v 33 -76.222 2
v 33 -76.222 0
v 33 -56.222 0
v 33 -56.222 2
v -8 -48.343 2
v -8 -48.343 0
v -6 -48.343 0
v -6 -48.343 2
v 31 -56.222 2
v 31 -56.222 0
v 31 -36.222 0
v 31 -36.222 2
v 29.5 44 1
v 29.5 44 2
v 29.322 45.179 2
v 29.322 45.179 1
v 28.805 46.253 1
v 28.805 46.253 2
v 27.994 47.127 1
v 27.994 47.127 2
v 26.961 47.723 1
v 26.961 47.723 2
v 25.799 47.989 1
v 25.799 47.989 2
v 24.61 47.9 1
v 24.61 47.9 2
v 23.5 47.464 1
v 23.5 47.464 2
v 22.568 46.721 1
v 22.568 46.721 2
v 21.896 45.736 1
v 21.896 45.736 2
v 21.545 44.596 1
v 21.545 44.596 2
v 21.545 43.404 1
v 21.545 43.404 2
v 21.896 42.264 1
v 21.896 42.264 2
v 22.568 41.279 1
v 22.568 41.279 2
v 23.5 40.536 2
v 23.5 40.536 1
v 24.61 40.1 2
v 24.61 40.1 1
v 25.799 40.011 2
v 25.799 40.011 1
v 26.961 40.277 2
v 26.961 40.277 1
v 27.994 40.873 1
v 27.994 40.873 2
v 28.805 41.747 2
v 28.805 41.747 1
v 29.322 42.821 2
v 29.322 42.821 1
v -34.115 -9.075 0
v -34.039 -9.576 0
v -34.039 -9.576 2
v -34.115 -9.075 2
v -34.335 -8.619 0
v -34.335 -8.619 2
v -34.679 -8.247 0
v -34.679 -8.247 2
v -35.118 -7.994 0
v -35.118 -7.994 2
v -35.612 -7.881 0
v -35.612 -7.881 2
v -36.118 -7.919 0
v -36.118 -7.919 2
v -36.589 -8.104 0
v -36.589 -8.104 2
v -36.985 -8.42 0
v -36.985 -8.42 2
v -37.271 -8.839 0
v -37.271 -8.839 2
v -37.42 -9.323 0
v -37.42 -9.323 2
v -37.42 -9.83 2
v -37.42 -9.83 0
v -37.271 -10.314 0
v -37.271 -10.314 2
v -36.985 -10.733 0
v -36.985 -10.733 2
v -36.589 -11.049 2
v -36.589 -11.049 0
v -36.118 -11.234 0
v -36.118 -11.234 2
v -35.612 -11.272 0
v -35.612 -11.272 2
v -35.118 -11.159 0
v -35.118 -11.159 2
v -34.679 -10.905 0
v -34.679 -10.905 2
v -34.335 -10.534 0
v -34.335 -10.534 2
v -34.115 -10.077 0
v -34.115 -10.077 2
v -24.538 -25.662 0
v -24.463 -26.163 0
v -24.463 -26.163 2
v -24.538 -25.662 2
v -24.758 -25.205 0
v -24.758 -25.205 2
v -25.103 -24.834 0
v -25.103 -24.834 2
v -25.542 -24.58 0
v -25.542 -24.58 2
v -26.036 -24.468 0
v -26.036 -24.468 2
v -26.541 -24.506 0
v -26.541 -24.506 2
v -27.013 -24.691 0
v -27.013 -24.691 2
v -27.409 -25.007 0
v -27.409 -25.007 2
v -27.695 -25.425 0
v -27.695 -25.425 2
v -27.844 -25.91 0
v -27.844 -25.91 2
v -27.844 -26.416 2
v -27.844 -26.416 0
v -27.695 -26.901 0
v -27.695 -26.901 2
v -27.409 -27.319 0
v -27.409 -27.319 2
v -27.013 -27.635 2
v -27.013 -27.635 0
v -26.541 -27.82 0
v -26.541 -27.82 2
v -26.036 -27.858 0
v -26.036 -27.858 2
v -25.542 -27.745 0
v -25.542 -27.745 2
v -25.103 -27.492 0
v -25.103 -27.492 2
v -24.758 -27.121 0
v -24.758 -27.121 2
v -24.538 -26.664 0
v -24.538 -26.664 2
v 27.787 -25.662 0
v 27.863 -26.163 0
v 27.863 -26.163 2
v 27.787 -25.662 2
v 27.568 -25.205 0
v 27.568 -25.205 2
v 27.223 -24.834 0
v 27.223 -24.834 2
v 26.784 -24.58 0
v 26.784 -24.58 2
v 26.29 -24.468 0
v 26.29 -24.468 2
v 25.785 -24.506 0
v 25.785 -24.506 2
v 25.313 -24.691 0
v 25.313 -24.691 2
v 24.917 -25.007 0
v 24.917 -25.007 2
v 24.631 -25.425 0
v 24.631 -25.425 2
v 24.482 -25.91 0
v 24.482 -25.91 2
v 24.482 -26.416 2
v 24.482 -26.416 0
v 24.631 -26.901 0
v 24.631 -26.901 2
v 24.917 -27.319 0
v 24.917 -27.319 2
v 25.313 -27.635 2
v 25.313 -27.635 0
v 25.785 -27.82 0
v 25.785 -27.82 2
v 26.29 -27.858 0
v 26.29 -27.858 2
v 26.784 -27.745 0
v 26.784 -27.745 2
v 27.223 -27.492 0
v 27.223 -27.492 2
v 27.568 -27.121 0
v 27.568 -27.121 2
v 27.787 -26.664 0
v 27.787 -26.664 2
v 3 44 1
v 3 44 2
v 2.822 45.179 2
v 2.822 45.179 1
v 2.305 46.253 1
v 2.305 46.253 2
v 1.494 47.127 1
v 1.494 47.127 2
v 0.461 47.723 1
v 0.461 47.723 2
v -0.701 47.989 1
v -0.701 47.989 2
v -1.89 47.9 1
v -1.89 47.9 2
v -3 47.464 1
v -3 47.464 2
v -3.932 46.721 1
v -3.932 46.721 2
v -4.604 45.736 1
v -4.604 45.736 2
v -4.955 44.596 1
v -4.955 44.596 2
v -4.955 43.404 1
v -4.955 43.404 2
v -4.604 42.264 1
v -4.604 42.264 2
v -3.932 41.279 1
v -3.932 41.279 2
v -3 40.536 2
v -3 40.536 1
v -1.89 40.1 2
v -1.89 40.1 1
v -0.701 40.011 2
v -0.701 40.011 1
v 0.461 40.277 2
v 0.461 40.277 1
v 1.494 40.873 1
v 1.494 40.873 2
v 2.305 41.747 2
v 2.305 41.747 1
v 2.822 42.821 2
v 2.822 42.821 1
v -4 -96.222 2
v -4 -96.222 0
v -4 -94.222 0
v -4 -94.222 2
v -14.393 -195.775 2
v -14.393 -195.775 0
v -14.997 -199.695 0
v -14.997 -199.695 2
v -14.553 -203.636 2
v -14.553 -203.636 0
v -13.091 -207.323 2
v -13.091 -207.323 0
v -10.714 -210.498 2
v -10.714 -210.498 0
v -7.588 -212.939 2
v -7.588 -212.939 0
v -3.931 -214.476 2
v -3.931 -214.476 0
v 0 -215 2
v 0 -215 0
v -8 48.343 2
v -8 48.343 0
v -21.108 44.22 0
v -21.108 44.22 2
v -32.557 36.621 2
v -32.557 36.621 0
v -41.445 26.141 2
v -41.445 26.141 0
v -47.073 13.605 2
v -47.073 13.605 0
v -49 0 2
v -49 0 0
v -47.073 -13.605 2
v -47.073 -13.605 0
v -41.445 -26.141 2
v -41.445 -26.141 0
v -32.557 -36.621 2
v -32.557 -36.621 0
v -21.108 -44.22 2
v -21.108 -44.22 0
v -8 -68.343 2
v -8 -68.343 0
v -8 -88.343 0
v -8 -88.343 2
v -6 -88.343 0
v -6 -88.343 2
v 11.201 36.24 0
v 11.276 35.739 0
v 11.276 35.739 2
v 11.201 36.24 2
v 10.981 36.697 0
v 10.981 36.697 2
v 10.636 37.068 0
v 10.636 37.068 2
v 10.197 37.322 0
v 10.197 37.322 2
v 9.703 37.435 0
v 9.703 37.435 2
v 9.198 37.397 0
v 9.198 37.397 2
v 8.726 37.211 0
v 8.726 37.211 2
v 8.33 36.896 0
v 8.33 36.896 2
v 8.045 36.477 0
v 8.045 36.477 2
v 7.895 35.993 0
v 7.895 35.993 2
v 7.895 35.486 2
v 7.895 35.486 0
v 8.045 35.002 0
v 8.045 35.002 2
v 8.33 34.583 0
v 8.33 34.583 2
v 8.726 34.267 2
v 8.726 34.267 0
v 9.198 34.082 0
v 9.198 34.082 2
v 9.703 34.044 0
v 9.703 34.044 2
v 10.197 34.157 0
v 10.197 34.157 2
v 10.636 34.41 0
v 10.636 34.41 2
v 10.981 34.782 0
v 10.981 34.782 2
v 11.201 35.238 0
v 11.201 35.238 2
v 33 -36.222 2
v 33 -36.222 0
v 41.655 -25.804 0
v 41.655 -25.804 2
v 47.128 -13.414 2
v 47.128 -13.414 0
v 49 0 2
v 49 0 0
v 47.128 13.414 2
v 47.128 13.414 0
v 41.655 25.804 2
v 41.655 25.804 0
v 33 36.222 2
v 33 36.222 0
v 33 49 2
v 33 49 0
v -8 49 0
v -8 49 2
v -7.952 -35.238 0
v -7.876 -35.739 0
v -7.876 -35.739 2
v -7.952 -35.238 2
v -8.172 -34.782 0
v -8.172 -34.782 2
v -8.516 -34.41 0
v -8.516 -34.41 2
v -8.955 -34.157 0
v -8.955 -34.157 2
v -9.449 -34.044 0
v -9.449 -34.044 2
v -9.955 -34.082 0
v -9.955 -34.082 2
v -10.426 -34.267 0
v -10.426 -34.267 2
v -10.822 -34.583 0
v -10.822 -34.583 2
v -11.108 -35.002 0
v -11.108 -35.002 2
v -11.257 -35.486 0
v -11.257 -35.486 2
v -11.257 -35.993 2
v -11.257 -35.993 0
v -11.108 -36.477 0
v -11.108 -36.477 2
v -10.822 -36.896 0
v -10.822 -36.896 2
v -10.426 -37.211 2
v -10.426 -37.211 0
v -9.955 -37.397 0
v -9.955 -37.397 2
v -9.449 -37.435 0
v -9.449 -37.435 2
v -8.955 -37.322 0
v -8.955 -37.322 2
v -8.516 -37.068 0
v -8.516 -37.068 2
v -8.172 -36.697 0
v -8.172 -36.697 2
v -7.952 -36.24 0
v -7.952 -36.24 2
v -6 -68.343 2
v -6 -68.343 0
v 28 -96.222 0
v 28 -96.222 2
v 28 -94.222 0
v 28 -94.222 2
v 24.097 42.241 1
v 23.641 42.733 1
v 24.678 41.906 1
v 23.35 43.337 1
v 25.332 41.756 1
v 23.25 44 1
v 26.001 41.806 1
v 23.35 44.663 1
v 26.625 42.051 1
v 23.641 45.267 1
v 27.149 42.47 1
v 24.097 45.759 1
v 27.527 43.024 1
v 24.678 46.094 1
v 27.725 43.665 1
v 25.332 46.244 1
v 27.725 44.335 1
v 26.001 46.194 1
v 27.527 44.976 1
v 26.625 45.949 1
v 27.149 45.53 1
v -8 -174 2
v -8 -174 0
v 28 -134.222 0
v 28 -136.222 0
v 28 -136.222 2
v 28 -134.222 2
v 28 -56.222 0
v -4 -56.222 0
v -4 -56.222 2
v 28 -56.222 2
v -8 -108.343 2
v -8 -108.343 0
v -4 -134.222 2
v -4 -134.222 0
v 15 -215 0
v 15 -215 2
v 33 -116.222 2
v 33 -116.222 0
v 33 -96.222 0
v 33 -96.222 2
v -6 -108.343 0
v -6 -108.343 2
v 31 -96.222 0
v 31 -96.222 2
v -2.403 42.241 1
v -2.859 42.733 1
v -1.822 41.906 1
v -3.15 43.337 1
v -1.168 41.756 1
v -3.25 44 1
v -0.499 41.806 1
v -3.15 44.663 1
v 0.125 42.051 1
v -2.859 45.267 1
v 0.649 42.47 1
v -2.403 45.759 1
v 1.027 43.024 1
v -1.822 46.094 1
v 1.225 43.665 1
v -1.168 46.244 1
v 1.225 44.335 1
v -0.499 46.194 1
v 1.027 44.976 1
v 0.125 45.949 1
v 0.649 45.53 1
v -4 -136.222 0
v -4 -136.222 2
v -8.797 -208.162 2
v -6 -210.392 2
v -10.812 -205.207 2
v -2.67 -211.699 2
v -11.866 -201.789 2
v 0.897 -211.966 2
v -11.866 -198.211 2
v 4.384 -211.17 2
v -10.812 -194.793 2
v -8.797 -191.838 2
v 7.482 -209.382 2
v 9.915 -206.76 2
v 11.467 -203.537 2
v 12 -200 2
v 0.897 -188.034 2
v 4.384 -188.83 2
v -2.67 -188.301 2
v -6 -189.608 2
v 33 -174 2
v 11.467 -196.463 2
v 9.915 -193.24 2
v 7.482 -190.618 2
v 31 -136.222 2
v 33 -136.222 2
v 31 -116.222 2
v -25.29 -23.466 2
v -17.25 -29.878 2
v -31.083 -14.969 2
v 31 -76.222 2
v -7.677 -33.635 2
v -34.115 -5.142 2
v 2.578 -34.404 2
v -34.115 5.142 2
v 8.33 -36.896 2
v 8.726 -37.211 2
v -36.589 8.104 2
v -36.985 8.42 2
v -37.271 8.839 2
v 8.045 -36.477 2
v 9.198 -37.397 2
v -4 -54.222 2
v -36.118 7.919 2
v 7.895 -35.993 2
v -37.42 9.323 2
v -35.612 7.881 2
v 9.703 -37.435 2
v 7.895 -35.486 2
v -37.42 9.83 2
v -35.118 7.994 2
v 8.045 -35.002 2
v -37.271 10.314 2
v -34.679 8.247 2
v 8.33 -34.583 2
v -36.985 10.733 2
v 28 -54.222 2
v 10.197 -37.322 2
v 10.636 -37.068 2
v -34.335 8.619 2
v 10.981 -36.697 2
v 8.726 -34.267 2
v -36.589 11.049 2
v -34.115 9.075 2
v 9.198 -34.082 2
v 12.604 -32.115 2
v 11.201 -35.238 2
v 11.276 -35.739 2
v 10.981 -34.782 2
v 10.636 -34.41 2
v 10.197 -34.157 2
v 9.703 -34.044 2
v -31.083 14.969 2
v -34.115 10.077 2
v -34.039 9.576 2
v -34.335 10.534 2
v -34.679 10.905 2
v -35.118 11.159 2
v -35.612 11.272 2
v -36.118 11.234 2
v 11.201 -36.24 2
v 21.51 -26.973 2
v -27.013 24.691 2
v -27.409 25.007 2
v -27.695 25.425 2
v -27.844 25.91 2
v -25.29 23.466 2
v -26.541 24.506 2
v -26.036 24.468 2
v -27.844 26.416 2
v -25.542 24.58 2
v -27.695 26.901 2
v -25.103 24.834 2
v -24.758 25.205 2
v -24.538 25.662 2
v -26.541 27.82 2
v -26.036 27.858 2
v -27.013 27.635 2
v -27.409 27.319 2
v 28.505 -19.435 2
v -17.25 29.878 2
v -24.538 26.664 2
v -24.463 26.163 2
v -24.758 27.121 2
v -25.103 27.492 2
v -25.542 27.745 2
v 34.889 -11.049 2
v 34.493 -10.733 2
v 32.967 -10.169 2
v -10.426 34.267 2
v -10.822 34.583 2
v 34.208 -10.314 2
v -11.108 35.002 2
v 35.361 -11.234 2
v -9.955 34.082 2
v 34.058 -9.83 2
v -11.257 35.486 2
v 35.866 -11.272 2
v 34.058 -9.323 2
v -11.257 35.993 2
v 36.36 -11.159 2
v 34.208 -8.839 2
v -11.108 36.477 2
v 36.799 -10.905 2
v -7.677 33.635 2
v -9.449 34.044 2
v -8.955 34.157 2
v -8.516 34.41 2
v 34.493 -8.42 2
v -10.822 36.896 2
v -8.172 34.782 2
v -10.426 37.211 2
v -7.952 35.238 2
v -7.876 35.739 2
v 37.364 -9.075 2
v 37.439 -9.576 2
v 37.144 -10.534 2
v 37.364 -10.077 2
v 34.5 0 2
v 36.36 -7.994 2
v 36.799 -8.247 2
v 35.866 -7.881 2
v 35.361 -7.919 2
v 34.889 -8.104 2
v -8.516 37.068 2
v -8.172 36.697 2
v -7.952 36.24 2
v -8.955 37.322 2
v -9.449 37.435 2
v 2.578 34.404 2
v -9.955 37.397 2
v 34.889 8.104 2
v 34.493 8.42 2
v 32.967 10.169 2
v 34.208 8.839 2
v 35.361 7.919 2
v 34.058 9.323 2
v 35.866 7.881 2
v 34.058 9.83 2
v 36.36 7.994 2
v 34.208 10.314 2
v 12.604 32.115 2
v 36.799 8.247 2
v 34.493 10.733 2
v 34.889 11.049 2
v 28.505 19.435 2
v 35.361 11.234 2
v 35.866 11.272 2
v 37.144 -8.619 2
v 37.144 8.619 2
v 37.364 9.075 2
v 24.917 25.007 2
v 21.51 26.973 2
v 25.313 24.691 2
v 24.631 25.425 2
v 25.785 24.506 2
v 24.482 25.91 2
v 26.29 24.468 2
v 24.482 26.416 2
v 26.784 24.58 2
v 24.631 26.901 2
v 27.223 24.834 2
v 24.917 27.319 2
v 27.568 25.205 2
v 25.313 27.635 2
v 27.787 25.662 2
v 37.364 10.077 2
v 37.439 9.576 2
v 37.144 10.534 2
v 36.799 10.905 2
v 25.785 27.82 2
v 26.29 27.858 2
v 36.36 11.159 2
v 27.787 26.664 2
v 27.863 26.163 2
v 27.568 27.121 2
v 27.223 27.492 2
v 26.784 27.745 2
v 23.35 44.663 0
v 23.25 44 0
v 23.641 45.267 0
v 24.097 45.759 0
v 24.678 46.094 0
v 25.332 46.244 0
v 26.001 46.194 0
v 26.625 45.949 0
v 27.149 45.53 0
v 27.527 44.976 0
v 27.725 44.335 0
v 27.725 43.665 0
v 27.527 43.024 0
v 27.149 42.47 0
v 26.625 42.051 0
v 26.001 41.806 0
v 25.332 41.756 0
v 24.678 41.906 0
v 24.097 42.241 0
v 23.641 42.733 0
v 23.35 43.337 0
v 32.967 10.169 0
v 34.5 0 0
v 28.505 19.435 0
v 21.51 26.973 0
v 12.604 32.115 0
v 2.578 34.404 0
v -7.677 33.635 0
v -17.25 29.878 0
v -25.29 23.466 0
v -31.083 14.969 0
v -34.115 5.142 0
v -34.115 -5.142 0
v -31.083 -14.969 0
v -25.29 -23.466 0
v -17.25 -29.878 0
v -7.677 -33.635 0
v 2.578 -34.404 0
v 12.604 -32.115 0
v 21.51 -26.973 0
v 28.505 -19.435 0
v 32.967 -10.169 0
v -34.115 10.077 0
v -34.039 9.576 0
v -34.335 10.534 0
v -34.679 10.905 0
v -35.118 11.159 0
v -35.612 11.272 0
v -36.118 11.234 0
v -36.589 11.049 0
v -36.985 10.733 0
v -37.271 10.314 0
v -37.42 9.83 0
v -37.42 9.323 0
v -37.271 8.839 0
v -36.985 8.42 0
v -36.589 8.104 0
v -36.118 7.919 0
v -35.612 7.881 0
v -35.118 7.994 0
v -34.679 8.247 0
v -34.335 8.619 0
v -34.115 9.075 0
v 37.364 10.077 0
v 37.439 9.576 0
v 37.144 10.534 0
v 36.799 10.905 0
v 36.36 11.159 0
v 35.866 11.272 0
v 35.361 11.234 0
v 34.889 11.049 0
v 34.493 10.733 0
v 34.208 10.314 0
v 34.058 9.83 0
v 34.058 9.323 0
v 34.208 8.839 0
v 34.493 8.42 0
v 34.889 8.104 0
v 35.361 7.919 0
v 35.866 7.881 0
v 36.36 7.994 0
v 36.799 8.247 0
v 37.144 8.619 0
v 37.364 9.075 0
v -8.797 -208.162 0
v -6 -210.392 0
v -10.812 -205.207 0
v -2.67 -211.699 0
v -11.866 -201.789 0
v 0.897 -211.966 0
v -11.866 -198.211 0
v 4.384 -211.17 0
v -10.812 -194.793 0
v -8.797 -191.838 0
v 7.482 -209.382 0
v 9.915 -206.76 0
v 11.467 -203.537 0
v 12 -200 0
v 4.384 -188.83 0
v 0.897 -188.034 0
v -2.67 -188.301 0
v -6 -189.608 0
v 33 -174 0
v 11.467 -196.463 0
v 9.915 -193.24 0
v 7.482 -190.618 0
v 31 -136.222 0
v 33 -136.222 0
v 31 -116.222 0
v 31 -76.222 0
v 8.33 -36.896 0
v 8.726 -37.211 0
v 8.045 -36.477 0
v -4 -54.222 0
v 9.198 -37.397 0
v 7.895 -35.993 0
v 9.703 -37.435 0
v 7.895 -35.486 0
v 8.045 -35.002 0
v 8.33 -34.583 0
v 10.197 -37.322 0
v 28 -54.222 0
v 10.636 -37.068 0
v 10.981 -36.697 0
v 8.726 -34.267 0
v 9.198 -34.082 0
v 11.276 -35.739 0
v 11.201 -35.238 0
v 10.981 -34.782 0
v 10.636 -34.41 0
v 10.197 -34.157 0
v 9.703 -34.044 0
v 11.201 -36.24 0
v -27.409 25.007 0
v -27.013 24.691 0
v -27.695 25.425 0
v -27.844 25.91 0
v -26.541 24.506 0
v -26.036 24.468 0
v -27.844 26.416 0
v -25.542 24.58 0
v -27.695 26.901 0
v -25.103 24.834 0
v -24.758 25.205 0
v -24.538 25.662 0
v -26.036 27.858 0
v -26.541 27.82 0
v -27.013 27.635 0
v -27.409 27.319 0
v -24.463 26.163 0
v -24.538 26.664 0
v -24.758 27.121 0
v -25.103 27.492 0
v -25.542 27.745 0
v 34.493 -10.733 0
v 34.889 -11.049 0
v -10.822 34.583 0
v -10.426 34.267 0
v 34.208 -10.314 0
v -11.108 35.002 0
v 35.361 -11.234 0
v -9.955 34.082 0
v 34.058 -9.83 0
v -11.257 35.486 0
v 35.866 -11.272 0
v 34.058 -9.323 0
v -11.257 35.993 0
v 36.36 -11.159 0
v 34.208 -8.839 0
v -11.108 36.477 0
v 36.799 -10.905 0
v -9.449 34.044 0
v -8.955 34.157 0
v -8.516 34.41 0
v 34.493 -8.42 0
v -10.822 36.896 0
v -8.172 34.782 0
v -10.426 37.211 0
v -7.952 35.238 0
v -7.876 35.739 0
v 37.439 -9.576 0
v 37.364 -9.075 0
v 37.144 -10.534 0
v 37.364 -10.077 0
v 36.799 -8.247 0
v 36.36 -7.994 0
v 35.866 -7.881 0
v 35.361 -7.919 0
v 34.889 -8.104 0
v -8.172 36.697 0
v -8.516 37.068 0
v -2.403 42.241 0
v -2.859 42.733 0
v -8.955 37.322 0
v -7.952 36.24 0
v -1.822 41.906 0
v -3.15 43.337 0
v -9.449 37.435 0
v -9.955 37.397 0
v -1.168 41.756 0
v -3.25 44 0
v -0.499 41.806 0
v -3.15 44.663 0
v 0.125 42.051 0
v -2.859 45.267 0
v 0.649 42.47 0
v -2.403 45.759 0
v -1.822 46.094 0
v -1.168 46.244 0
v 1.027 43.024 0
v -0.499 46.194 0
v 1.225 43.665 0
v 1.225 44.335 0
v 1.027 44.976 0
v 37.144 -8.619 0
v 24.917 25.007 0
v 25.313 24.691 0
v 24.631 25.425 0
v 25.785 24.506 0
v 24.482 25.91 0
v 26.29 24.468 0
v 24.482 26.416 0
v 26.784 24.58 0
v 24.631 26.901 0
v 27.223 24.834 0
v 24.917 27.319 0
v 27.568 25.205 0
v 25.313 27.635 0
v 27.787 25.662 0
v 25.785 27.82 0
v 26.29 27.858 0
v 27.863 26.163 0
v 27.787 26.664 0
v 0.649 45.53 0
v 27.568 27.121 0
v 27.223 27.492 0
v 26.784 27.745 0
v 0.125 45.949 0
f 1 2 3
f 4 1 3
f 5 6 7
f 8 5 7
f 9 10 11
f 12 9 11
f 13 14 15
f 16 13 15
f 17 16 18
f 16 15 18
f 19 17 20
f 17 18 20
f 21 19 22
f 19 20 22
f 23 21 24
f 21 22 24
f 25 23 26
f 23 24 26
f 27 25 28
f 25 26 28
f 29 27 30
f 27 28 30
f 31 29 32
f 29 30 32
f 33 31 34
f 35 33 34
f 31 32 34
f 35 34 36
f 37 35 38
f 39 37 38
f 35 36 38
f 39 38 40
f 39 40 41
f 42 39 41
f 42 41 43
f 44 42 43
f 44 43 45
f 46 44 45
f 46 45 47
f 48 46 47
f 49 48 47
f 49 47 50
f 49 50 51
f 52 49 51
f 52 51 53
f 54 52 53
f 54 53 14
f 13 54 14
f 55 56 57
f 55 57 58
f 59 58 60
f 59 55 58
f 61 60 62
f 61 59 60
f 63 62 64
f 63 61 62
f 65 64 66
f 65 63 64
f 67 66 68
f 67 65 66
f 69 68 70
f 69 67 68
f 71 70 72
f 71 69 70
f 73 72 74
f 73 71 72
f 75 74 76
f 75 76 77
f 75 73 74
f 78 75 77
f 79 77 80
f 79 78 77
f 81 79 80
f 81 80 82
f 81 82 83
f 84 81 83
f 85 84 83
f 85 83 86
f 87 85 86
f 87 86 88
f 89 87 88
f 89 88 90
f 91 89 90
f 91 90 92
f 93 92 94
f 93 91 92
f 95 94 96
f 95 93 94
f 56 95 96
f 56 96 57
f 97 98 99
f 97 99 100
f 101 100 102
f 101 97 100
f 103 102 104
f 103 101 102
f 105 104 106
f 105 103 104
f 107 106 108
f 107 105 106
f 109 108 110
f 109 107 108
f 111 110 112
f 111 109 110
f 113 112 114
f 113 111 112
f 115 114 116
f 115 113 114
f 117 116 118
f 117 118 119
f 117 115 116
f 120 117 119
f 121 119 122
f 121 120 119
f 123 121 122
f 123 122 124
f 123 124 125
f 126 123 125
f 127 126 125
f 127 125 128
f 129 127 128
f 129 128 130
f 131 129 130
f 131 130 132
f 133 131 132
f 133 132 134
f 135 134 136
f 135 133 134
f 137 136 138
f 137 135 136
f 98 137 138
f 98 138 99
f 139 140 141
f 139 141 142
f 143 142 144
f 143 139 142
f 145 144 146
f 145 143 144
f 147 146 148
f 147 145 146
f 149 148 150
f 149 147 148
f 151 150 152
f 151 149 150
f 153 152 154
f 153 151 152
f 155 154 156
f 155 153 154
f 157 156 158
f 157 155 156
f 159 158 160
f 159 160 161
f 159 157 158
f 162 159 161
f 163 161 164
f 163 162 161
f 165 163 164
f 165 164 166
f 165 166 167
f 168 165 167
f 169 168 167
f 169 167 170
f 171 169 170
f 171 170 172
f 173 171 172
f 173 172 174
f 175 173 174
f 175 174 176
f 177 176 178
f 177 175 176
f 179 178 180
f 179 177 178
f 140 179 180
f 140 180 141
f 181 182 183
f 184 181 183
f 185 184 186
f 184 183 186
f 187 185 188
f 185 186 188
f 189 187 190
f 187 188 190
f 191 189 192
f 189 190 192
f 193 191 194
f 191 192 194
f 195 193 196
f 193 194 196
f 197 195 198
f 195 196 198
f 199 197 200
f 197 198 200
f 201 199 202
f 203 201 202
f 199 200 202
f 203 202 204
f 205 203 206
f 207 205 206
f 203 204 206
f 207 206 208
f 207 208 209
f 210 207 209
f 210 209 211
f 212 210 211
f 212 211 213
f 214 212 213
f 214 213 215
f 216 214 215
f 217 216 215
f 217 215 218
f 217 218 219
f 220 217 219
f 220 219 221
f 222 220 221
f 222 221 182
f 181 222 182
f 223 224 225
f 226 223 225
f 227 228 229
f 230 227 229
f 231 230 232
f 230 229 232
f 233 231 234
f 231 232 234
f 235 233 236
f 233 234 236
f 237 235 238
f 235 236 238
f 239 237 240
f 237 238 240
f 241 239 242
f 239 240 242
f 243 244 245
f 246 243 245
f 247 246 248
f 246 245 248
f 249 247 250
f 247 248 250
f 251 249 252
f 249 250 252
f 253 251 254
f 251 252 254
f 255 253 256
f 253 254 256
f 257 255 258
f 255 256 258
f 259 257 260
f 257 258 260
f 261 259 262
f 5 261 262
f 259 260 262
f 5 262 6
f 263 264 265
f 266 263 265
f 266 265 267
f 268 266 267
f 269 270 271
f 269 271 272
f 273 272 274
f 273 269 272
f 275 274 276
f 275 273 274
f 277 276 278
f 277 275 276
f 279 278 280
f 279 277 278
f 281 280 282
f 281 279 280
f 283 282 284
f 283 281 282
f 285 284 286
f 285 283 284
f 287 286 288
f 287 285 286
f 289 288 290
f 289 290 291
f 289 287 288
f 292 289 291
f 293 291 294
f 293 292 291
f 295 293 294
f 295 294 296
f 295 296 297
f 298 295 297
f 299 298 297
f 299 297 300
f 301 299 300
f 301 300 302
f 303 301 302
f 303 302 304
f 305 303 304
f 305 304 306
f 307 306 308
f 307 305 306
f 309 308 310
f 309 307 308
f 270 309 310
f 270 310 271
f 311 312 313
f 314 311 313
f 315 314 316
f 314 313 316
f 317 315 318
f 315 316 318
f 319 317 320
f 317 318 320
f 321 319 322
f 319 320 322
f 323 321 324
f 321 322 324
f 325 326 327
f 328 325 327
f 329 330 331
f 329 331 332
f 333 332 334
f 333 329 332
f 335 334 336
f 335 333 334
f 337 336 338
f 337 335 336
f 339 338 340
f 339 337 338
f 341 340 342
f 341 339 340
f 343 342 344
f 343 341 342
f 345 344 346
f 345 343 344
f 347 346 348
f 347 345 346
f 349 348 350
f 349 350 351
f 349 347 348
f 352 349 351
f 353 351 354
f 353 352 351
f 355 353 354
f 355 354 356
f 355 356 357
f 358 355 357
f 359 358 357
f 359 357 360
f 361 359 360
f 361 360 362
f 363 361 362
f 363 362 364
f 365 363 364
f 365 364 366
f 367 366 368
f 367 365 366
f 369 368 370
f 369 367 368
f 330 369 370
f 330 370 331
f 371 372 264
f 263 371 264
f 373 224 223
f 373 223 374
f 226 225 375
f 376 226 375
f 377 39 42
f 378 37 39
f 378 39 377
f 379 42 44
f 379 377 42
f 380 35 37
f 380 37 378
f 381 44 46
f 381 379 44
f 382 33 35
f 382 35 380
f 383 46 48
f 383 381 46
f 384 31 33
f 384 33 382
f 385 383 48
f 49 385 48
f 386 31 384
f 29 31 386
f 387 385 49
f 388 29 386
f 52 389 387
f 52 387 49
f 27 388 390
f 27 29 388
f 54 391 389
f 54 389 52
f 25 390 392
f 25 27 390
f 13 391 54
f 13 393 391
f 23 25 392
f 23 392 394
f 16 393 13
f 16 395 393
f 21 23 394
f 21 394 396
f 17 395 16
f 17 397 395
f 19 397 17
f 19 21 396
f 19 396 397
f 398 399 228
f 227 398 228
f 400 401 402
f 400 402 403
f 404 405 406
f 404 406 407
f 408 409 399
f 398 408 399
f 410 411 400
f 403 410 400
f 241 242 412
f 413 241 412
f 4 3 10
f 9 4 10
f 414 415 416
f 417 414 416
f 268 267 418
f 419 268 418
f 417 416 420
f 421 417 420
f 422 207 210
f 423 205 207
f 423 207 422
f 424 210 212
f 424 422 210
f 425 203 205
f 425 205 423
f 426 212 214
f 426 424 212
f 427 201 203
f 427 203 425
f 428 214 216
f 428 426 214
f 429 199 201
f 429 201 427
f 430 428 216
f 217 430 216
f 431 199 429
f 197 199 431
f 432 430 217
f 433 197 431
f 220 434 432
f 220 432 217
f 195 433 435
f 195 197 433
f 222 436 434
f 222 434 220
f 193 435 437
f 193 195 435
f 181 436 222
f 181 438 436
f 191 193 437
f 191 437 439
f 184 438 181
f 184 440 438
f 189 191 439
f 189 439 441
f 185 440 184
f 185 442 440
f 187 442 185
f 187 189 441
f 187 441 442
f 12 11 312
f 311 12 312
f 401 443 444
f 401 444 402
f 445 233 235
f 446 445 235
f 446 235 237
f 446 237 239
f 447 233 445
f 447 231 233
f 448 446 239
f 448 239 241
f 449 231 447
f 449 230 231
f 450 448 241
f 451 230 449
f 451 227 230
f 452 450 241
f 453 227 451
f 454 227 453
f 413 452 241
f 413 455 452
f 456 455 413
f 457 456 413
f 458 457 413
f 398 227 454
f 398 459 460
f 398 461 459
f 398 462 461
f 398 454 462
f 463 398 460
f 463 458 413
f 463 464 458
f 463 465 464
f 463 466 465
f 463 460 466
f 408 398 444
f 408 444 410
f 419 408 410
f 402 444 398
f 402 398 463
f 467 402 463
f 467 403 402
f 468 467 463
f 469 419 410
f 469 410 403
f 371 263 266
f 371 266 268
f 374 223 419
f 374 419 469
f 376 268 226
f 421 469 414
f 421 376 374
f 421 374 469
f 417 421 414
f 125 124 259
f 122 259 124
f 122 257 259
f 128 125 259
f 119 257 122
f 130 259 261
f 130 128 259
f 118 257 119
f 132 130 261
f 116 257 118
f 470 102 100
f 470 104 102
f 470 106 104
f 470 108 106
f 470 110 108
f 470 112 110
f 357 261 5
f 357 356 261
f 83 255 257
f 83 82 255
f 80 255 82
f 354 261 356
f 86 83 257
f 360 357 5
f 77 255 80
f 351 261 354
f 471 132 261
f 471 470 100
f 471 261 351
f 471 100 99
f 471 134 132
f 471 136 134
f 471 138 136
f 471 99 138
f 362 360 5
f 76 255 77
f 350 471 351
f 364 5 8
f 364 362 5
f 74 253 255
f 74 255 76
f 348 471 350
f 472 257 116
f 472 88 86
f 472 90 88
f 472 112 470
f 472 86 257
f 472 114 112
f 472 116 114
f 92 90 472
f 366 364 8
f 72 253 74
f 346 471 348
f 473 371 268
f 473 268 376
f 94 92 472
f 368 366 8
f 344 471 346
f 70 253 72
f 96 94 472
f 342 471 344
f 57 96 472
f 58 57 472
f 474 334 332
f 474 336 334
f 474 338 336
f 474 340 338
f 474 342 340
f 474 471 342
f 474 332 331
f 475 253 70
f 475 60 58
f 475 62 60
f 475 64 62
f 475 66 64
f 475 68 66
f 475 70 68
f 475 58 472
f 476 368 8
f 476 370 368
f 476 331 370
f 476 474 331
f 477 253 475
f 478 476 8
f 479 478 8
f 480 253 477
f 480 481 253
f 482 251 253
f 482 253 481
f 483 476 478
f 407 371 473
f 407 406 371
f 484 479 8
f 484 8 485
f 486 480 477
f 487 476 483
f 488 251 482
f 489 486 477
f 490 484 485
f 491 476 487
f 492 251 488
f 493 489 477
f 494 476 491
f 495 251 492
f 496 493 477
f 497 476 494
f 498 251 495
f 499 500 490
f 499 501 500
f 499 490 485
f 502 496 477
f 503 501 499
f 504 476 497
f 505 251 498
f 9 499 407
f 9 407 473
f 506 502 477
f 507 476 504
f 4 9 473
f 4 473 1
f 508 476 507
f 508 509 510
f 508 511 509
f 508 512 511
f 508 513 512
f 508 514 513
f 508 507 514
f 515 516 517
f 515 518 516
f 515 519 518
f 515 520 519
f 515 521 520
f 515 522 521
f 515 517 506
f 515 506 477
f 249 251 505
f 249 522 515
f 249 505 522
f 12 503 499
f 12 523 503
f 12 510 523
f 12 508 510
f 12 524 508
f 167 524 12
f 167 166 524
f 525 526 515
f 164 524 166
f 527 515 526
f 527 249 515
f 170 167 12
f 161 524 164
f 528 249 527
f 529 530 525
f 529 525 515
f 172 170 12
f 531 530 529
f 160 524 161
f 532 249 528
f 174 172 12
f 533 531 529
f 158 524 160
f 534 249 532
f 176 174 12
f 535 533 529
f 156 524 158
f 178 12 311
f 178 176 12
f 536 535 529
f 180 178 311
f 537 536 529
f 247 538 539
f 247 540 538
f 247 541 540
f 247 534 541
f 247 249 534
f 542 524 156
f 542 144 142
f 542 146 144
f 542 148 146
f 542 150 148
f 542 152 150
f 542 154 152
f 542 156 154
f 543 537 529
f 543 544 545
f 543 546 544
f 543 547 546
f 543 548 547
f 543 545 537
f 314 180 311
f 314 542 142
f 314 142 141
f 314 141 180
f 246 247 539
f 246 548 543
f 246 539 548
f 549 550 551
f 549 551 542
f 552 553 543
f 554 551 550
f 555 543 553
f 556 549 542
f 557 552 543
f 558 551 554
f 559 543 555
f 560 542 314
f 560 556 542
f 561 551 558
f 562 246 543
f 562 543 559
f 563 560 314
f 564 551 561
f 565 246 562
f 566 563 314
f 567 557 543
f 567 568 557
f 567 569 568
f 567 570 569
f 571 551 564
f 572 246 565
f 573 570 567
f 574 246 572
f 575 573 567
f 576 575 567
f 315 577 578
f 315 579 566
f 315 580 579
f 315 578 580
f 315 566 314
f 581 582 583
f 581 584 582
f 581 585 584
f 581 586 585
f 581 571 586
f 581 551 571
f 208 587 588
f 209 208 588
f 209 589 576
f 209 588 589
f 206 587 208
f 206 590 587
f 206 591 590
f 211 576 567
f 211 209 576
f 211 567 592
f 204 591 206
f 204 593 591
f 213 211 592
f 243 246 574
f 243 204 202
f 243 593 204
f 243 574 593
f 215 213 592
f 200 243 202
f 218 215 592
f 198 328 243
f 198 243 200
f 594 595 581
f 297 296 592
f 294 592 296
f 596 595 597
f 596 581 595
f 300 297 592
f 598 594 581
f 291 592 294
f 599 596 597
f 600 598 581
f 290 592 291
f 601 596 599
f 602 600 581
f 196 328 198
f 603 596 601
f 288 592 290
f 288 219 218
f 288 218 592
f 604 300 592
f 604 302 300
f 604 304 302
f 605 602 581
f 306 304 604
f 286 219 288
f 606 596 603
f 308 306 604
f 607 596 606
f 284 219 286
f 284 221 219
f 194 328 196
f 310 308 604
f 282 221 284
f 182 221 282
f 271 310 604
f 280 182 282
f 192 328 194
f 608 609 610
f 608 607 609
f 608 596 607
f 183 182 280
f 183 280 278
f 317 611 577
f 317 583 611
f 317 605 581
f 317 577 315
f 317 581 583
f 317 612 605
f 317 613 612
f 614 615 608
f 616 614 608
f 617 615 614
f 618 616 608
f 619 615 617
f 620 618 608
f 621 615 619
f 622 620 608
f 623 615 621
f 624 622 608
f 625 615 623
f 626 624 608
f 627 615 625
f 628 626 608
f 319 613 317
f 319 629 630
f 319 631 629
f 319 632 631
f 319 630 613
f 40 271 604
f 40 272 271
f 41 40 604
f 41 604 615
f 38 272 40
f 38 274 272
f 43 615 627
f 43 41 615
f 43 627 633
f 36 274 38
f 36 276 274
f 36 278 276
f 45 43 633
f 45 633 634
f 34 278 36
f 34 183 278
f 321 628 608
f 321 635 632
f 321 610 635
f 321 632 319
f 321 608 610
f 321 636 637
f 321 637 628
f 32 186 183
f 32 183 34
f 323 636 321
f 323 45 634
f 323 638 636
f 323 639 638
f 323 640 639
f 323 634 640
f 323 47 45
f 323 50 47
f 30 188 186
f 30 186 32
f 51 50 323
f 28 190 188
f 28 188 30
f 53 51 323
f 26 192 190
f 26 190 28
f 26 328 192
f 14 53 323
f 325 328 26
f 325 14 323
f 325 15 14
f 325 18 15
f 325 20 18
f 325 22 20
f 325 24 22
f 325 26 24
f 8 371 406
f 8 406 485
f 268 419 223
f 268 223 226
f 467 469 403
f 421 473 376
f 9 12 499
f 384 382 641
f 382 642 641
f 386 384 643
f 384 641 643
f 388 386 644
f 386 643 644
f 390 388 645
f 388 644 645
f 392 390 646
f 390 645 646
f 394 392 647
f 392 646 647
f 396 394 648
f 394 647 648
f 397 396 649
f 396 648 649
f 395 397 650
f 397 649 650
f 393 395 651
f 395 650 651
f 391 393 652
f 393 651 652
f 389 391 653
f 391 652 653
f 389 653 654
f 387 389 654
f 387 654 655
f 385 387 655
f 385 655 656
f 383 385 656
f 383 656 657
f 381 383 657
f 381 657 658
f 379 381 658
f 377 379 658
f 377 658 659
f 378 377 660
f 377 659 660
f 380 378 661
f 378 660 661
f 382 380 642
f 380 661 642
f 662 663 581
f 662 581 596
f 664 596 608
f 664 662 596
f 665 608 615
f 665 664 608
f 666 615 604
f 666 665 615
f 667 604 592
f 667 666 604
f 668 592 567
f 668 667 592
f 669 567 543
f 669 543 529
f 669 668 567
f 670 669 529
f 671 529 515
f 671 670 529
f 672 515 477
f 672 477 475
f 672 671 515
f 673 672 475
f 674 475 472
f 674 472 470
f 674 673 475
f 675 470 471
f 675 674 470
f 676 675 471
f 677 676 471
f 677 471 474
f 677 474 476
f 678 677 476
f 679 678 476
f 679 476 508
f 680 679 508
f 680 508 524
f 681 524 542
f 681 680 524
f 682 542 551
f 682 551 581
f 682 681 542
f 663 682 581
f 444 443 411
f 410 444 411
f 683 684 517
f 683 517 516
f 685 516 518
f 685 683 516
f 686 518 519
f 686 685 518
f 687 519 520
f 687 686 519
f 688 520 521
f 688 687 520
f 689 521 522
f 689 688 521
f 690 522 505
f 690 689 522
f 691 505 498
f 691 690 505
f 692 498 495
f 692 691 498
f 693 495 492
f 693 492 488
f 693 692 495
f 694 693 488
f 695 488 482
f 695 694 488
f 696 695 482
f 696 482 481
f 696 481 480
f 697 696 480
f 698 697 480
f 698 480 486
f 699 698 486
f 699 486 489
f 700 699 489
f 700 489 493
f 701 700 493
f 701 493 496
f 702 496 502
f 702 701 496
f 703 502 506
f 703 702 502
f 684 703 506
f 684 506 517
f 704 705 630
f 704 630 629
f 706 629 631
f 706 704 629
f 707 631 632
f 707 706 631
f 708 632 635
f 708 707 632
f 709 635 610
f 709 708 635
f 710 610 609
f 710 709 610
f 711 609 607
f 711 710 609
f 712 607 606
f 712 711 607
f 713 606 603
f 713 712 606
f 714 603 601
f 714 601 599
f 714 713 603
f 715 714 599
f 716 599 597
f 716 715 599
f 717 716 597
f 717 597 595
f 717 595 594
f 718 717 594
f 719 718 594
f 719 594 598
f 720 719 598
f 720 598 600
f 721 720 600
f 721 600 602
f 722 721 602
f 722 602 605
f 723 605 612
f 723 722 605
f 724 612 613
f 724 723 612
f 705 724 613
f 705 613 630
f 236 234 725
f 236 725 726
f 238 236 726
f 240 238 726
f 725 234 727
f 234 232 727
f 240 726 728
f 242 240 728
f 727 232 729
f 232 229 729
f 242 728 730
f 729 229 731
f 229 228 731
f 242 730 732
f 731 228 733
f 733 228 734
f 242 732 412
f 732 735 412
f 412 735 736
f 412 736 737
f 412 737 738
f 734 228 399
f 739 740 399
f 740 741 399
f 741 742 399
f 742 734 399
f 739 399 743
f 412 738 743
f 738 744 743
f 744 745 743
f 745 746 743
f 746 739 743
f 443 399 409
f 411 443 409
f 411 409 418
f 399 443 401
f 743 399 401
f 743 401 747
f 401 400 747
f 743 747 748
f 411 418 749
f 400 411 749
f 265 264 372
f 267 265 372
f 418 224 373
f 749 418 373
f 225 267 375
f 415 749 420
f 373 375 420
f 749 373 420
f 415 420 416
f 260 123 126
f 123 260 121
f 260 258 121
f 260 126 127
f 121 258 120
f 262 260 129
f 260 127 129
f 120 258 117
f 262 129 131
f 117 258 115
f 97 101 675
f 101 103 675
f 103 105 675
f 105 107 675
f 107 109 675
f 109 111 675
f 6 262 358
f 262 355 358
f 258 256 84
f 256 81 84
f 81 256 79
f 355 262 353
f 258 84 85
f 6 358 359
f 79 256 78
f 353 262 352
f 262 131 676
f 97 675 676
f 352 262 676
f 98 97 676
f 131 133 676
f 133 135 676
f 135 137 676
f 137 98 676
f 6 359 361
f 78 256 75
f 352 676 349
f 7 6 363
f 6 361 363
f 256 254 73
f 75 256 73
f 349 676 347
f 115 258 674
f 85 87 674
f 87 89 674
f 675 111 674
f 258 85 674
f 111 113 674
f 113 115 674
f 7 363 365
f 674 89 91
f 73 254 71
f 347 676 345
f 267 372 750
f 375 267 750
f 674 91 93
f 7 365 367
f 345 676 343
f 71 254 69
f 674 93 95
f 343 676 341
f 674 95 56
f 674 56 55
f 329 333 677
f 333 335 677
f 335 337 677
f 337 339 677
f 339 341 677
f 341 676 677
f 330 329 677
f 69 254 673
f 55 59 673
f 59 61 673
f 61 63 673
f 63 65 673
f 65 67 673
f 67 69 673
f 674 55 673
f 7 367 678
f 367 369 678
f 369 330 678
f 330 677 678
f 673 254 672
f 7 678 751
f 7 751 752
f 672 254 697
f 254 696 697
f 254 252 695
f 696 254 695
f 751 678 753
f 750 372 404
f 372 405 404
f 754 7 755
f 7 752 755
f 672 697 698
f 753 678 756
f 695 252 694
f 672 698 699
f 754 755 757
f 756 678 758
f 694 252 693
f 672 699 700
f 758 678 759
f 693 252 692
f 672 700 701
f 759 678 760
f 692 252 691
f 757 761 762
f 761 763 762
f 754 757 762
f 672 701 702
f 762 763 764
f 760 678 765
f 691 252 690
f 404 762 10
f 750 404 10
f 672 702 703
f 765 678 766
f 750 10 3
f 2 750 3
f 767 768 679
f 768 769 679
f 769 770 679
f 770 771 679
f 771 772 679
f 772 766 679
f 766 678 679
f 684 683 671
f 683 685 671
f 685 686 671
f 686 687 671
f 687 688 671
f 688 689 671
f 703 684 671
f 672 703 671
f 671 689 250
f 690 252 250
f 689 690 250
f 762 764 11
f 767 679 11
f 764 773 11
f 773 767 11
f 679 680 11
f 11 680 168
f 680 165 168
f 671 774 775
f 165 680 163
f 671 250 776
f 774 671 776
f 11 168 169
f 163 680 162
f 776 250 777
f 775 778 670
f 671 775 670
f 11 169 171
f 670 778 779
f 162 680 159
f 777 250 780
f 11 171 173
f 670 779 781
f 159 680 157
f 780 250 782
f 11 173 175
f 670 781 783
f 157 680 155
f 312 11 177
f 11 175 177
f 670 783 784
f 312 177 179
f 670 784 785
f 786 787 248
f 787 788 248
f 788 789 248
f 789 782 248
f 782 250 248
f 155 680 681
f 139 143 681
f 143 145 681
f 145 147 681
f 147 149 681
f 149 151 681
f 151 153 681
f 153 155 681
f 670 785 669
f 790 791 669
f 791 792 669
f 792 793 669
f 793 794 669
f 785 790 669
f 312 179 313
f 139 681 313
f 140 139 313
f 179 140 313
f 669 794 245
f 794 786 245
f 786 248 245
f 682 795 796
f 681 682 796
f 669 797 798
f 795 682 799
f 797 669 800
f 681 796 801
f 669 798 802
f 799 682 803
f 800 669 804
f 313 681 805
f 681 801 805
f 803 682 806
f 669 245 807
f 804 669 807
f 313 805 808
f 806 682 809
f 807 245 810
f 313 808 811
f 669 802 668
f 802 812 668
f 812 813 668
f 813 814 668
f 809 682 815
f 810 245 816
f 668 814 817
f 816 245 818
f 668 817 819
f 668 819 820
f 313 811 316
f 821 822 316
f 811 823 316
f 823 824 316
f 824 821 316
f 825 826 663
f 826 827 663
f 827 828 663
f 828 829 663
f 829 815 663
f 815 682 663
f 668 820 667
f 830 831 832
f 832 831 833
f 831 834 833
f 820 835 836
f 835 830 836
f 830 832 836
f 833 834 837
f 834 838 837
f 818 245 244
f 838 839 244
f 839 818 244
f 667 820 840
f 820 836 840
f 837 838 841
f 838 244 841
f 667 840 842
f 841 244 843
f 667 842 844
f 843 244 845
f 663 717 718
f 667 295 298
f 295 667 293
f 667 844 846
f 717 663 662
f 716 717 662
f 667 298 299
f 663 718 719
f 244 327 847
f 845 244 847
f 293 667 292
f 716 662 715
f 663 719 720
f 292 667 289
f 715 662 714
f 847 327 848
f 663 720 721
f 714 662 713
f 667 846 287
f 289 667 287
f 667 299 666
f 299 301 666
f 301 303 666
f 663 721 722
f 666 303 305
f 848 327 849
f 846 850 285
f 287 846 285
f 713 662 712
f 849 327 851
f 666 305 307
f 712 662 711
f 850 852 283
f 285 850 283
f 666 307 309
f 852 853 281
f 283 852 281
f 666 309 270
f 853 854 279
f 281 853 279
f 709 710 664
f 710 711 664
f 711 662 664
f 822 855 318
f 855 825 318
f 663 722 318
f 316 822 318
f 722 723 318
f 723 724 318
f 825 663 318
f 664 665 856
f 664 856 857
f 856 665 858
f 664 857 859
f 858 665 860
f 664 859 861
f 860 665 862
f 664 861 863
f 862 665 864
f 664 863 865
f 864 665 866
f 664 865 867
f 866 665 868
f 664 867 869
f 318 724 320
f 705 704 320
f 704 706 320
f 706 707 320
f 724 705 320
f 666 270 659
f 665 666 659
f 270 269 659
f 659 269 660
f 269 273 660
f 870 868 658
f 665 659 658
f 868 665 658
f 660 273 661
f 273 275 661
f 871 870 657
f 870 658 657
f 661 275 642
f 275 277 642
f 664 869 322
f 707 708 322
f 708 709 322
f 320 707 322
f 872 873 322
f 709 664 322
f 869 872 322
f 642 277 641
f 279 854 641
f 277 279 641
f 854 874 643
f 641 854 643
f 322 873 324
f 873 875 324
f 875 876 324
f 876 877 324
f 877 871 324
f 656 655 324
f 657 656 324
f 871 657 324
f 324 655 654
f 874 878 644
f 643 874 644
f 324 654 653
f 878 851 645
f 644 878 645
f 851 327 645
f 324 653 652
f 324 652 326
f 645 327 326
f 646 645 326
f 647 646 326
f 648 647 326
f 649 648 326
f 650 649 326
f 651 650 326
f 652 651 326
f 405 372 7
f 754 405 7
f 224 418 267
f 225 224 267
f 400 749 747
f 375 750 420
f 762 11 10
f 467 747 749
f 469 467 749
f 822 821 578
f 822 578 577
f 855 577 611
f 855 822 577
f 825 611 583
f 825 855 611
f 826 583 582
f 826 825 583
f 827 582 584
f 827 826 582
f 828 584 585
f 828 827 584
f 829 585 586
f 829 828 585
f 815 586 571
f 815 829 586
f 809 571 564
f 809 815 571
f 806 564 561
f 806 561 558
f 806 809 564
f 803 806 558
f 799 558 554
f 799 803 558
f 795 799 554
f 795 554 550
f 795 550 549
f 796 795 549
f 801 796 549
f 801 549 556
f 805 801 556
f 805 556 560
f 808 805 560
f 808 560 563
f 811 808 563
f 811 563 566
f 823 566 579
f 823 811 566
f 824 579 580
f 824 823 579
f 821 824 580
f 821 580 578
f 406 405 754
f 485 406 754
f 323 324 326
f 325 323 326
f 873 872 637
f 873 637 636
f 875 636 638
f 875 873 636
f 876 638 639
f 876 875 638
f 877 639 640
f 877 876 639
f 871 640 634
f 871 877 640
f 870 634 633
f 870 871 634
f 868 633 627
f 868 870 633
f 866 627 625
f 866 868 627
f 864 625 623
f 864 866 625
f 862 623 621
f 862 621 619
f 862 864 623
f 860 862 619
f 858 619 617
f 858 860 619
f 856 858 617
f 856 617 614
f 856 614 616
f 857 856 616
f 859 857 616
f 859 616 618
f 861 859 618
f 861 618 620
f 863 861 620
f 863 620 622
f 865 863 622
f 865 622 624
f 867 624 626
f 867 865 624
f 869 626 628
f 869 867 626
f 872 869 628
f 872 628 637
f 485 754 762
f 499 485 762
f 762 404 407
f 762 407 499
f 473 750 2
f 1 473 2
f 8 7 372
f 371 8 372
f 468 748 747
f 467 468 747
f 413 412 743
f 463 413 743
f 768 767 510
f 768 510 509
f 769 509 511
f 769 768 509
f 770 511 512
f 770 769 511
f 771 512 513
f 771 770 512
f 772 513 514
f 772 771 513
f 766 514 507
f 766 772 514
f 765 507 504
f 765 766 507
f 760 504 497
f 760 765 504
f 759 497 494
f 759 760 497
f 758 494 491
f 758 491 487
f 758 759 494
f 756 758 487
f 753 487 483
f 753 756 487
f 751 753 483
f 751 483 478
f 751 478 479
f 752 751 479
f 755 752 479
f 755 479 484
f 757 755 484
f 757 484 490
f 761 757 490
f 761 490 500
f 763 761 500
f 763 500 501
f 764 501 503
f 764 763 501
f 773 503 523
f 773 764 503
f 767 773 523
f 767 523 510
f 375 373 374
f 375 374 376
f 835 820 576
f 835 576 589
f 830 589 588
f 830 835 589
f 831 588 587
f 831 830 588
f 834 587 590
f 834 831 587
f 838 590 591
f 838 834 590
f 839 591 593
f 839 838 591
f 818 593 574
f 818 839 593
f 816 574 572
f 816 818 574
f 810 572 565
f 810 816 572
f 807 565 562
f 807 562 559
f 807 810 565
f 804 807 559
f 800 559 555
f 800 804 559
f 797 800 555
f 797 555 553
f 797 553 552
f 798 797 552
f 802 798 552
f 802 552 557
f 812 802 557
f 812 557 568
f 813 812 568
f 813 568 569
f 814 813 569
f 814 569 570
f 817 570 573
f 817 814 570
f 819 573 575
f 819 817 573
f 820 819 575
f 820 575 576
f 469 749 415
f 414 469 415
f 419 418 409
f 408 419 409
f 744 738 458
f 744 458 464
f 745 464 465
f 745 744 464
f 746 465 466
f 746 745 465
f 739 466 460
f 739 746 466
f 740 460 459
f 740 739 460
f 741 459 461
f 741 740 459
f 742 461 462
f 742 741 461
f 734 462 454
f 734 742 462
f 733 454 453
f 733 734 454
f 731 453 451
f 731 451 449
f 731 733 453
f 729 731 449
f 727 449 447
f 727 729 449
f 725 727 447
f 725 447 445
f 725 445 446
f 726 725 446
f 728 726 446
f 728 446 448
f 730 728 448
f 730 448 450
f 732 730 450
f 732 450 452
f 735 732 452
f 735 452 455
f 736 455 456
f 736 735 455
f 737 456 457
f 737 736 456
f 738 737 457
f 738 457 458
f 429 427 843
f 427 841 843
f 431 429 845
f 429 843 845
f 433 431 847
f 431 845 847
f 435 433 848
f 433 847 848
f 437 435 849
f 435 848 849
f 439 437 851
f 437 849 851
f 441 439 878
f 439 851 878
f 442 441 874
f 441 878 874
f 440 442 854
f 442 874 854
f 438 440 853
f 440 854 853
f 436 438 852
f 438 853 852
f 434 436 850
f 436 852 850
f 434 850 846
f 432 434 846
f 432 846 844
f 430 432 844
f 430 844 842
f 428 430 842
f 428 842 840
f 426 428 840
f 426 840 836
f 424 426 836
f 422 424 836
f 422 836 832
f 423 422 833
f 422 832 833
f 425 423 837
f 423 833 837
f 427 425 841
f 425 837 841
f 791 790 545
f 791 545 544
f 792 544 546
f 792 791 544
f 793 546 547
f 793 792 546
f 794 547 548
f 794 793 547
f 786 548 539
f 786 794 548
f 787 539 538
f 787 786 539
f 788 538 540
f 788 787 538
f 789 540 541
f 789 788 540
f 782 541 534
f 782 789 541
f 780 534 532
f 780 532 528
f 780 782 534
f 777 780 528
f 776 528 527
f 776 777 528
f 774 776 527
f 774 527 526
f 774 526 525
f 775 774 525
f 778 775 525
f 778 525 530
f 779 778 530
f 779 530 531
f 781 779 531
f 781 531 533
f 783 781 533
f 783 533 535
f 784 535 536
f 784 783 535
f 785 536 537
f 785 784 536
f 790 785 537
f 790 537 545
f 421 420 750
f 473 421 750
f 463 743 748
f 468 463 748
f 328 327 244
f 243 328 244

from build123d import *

# Parameters (mm, degrees)
SKETCH_1_R                   = 12
SKETCH_1_W                   = 32
SKETCH_1_H                   = 2
SKETCH_1_R_2                 = 1.7
SKETCH_1_R_3                 = 34.5
EXTRUDE_1_DEPTH              = 2
HOLE_WIZARD_M4_1_D           = 4.5
HOLE_WIZARD_M4_1_CBORE_D     = 8
HOLE_WIZARD_M4_1_CBORE_DEPTH = 1


with BuildPart() as part:
    # 草图1 → 凸台-拉伸1 (new body)
    with BuildSketch(Plane.XY):
        with BuildLine():
            ThreePointArc((-8, 48.342527861), (-49, 0), (-8, -48.342527861))
            Line((-8, -48.342527861), (-6, -48.342527861))
            Line((-6, -48.342527861), (-6, -68.342527861))
            Line((-6, -68.342527861), (-8, -68.342527861))
            Line((-8, -68.342527861), (-8, -88.342527861))
            Line((-8, -88.342527861), (-6, -88.342527861))
            Line((-6, -88.342527861), (-6, -108.342527861))
            Line((-6, -108.342527861), (-8, -108.342527861))
            Line((-8, -108.342527861), (-8, -128.342527861))
            Line((-8, -128.342527861), (-8, -174))
            Line((-8, -174), (-14.392579, -195.774639692))
            ThreePointArc((-14.392579, -195.774639692), (-12.007922481, -208.989426995), (0, -215))
            Line((0, -215), (15, -215))
            Line((15, -215), (33, -174))
            Line((33, -174), (33, -136.221540553))
            Line((33, -136.221540553), (31, -136.221540553))
            Line((31, -136.221540553), (31, -116.221540553))
            Line((31, -116.221540553), (33, -116.221540553))
            Line((33, -116.221540553), (33, -96.221540553))
            Line((33, -96.221540553), (31, -96.221540553))
            Line((31, -96.221540553), (31, -76.221540553))
            Line((31, -76.221540553), (33, -76.221540553))
            Line((33, -76.221540553), (33, -56.221540553))
            Line((33, -56.221540553), (31, -56.221540553))
            Line((31, -56.221540553), (31, -36.221540553))
            Line((31, -36.221540553), (33, -36.221540553))
            ThreePointArc((33, -36.221540553), (49, 0), (33, 36.221540553))
            Line((33, 36.221540553), (33, 49))
            Line((33, 49), (-8, 49))
            Line((-8, 49), (-8, 48.342527861))
        make_face()
        with Locations((0, -200)):
            Circle(SKETCH_1_R, mode=Mode.SUBTRACT)
        with Locations((12, -135.221540553)):
            Rectangle(SKETCH_1_W, SKETCH_1_H, mode=Mode.SUBTRACT)
        with Locations((12, -95.221540553)):
            Rectangle(SKETCH_1_W, SKETCH_1_H, mode=Mode.SUBTRACT)
        with Locations((-26.162950904, -26.162950904)):
            Circle(SKETCH_1_R_2, mode=Mode.SUBTRACT)
        with Locations((-9.576304669, -35.739255573)):
            Circle(SKETCH_1_R_2, mode=Mode.SUBTRACT)
        with Locations((-35.739255573, -9.576304669)):
            Circle(SKETCH_1_R_2, mode=Mode.SUBTRACT)
        with Locations((-35.739255573, 9.576304669)):
            Circle(SKETCH_1_R_2, mode=Mode.SUBTRACT)
        with Locations((-26.162950904, 26.162950904)):
            Circle(SKETCH_1_R_2, mode=Mode.SUBTRACT)
        Circle(SKETCH_1_R_3, mode=Mode.SUBTRACT)
        with Locations((-9.576304669, 35.739255573)):
            Circle(SKETCH_1_R_2, mode=Mode.SUBTRACT)
        with Locations((12, -55.221540553)):
            Rectangle(SKETCH_1_W, SKETCH_1_H, mode=Mode.SUBTRACT)
        with Locations((9.576304669, -35.739255573)):
            Circle(SKETCH_1_R_2, mode=Mode.SUBTRACT)
        with Locations((26.162950904, -26.162950904)):
            Circle(SKETCH_1_R_2, mode=Mode.SUBTRACT)
        with Locations((9.576304669, 35.739255573)):
            Circle(SKETCH_1_R_2, mode=Mode.SUBTRACT)
        with Locations((35.739255573, -9.576304669)):
            Circle(SKETCH_1_R_2, mode=Mode.SUBTRACT)
        with Locations((35.739255573, 9.576304669)):
            Circle(SKETCH_1_R_2, mode=Mode.SUBTRACT)
        with Locations((26.162950904, 26.162950904)):
            Circle(SKETCH_1_R_2, mode=Mode.SUBTRACT)
    extrude(amount=EXTRUDE_1_DEPTH)

    # M4 六角凹头盖的柱孔1 (through all)
    with Locations(Plane(origin=(-1, 44, 2), x_dir=(1, 0, 0), z_dir=(0, 0, 1))):
        with Locations((0, 0), (26.5, 0)):
            CounterBoreHole(HOLE_WIZARD_M4_1_D / 2, HOLE_WIZARD_M4_1_CBORE_D / 2, HOLE_WIZARD_M4_1_CBORE_DEPTH)


solid = part.part
